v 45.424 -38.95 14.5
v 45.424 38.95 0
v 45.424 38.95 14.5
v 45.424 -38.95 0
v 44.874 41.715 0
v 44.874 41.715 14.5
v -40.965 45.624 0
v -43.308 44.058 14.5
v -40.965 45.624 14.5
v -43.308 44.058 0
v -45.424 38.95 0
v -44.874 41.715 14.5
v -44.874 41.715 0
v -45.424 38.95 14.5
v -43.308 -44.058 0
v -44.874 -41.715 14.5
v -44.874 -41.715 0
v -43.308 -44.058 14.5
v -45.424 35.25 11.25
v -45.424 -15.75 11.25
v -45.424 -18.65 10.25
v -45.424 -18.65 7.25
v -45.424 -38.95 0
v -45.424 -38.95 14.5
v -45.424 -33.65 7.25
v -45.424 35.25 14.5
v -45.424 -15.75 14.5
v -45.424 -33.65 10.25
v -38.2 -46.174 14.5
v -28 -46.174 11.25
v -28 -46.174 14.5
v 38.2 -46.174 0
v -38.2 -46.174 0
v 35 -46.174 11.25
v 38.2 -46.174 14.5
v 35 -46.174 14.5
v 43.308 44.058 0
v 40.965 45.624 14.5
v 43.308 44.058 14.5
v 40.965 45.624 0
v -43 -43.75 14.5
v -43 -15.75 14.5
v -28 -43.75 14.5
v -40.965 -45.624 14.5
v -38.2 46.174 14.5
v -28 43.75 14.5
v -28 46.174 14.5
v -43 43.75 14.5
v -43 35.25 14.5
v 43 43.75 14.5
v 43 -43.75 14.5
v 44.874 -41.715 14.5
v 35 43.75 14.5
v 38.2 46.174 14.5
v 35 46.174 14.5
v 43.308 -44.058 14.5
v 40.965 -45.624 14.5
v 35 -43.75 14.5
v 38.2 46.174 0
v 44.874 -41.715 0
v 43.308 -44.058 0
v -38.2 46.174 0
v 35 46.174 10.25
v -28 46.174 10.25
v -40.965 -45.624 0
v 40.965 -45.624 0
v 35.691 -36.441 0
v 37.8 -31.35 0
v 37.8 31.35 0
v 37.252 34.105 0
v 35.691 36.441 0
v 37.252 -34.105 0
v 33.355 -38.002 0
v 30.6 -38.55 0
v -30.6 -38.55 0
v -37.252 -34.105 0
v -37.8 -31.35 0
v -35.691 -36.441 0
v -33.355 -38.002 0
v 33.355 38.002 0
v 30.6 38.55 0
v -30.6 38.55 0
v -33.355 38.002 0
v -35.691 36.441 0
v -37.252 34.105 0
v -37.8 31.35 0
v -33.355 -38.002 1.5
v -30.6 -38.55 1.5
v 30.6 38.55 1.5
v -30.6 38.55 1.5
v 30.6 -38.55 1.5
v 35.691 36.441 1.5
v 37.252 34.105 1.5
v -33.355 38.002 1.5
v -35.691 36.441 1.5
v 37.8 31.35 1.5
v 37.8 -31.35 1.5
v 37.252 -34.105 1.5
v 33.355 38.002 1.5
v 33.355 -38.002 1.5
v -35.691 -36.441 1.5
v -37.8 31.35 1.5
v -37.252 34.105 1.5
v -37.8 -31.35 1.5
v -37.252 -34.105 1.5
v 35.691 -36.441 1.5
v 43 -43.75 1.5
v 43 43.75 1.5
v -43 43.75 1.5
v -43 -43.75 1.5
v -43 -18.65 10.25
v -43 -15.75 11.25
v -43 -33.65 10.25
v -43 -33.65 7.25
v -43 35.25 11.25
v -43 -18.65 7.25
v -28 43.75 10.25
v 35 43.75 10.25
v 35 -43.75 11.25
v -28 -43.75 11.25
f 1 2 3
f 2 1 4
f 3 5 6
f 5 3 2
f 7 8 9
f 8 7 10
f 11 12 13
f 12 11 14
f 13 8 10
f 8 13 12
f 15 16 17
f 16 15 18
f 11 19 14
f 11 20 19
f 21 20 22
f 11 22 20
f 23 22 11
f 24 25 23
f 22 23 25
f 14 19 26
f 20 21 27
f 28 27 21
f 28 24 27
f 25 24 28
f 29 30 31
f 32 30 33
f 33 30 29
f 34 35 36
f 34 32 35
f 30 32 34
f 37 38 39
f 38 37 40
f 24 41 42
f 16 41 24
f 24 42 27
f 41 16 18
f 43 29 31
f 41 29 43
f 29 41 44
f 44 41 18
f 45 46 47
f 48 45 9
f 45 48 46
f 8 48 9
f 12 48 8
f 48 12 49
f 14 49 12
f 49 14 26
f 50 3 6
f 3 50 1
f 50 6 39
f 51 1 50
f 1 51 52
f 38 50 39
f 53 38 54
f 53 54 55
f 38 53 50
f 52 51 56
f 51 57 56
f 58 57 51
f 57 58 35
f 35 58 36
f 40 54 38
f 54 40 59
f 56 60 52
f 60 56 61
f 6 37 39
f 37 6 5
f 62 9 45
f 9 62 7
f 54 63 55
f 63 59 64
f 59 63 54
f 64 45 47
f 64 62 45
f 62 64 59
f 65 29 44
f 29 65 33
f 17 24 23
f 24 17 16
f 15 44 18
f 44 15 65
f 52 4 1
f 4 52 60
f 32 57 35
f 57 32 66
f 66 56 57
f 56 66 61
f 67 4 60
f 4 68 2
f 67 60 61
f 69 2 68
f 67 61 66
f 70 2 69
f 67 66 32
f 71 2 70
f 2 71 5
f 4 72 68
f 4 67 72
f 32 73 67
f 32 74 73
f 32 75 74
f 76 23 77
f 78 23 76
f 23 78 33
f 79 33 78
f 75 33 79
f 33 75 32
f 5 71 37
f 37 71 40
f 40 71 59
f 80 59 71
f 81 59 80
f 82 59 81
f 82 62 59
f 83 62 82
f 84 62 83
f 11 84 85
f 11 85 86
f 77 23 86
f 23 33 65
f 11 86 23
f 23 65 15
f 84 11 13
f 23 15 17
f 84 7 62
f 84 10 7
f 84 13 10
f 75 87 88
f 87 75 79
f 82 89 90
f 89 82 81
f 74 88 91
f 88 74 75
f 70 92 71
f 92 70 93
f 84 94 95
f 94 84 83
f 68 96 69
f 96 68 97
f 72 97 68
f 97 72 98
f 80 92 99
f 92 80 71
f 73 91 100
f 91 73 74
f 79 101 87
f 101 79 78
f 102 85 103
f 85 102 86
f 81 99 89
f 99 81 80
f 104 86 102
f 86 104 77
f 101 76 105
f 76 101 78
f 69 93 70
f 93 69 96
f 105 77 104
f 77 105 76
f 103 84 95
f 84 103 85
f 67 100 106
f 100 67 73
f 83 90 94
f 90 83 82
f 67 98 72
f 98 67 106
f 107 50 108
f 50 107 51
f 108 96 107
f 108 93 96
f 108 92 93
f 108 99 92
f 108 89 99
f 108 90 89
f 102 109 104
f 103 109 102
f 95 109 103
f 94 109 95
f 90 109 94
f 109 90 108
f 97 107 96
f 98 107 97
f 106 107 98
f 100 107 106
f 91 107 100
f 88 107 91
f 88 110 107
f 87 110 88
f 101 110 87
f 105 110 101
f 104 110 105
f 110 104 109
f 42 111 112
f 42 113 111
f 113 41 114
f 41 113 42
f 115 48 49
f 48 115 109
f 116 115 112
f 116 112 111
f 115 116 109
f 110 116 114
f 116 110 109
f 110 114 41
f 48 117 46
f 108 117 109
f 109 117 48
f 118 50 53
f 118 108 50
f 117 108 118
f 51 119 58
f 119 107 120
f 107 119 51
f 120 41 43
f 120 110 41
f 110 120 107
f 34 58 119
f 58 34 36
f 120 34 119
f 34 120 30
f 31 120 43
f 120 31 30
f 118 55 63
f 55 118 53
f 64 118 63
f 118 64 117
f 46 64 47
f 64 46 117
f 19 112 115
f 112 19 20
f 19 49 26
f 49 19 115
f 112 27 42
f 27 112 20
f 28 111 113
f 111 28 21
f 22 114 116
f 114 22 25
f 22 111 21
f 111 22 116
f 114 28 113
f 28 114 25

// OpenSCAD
// Fancy box for beagleboard, (c) 2010,2011 - Koen Kooi, licensed under CC-BY-SA

// Conventions: width = x, length = y, height = z


// width of PCB
inside_width = 86;

// lenght of PCB
inside_length = 87.5;

// outside wall thickness
edge_thickness = 2.4;
bottom_thickness = 1.5;
border_size = 10;

base_height = 13.5;

// Number of facets in curves, 32 is a good tradeoff between looks and processing speed
$fn=16;

// helper sizes, disable for final rendering
//helper(inside_width,inside_length,edge_thickness);
translate(v=[0,0,base_height/2]) box(inside_width, inside_length, bottom_thickness, base_height, border_size, edge_thickness);


module helper(inside_width,inside_length,edge_thickness) {
	translate(v=[0,0,-20]) cube([inside_width,inside_length,edge_thickness], center=true);
	translate(v=[-inside_width/2,0,20]) cube([edge_thickness,inside_length,edge_thickness], center=true);
}


module box(iw, il, bt, base_height, bs, et ) {

sh=2.5;
pcbt= 2;
box_length = inside_length + 2*et;
extra_height = 5;

	difference() {
		minkowski()
		{
		 cube([iw - 4 * et ,il - 4 * et,base_height], center=true);
		 cylinder(r=et*3.01,h=1);
		}
		minkowski()
		{
		 translate(v=[0,0, -bt]) cube([iw - 2 * bs - 2 * et, il - 2 * bs - 2 * et, base_height], center=true);
		 cylinder(r=et*3,h=1);		
		}
		translate(v=[0,0,bt]) cube([iw,il,base_height], center=true);



      //audio + hdmi: 63mm long, 15mm corner offset
      #translate(v = [-iw/2 + 15, -il/2 -et * 1.5, sh + pcbt]) {
        cube([63, et * 2, extra_height + 0.01], center=false);
      }
      //eth + usb: 63mm long, 15mm corner offset
      #translate(v = [-iw/2 + 15, il/2  - et/2, sh + pcbt -1 ]) {
        cube([63, et * 2, extra_height + 0.01 + 1], center=false);
      }
      //power + otg + serial: 51mm long, 28mm corner offset
      #translate(v = [-iw/2 -et*1.5 + -0.01, 28 + -il/2, sh + pcbt]) {
        cube([et *2, 51, extra_height + 0.01], center=false);
      }
      //microsd: 15mm long, 12.5mm corner offset
      translate(v = [-iw/2 -et*1.5 + -0.01, 12.5 +-il/2 -et, sh - pcbt]) {
        cube([et *2, 15, pcbt * 1.5], center=false);
      }


	}
}
